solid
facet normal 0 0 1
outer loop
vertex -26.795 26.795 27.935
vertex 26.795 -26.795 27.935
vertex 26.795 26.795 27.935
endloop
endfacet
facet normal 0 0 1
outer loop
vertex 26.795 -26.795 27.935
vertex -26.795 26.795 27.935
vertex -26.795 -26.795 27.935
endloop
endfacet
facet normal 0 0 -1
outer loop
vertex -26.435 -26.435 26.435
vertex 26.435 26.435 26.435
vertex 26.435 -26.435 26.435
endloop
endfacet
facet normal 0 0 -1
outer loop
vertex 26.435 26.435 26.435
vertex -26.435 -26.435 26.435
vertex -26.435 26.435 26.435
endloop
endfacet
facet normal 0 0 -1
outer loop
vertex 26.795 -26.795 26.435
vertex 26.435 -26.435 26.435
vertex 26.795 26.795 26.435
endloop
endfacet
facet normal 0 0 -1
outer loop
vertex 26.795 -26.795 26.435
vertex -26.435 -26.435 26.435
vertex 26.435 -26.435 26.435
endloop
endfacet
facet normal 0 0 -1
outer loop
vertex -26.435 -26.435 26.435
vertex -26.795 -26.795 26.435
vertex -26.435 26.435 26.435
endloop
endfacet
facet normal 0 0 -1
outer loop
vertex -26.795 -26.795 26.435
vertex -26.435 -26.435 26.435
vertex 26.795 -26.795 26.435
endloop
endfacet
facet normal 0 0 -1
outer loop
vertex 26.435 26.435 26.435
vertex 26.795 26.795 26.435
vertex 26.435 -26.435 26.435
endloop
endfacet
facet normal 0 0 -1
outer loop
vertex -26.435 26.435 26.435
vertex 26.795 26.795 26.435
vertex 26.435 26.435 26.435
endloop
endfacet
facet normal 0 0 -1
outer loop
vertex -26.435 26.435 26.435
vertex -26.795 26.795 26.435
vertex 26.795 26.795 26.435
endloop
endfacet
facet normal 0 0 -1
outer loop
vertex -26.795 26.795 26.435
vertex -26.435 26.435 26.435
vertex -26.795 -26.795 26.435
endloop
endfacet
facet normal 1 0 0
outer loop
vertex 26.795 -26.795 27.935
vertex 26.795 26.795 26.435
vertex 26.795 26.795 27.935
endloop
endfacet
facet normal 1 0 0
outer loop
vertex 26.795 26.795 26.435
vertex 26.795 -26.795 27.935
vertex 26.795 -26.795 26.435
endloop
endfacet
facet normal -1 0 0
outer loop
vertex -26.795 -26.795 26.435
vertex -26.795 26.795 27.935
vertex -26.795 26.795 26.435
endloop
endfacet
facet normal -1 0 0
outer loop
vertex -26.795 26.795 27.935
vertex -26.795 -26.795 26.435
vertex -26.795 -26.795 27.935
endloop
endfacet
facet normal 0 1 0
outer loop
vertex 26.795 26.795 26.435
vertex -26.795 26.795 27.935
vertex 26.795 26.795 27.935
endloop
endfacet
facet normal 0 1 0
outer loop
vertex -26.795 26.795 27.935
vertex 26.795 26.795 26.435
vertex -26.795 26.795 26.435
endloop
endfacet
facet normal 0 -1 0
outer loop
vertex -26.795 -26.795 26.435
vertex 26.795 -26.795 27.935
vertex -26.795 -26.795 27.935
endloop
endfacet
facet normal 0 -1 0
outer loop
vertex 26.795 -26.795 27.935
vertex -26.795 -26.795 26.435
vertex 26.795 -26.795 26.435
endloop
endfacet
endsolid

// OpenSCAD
// Cube Jeu Sphère 84mm

// changelog
// v5
// - Bouchon droit
version = 5;

arete = 55.871;
epaisseurParoi = 1.5;
r = 0.29; // résolution d'impression sur l'axe Z

// distance entre la paroi extérieure et la découpe
// minimum semble etre >nozzle_diameter pour Zortrax M200
offset_decoupe_bouchon = 0.84;
bouchonOffset = 0.3;

// Permet meilleur encastrement du bouchon pour ne pas qu'il
// dépasse après collage
decoupeZOffset = -r/2;

//decoupe_bouchon();
// corps_ouvert();
bouchon();
//trou();

module corps_ouvert() {
    difference() {
        cube_creux();
        #decoupe_bouchon(offset_decoupe_bouchon, decoupeZOffset);
    }
}

module bouchon() {
    difference () {
        intersection() {
            cube_creux();
            decoupe_bouchon(offset_decoupe_bouchon+bouchonOffset);
        }
    }
}

module cube_creux() {
    difference() {
        cube(arete, center=true);
        cube(arete-2*epaisseurParoi, center=true);
    }
}

module decoupe_bouchon(d, zOffset = 0) {
    a = arete - 2*d;
    translate([0,0,arete/2+((epaisseurParoi+1)/2)-epaisseurParoi+zOffset])
        cube([a, a, epaisseurParoi+1], center=true);
}
